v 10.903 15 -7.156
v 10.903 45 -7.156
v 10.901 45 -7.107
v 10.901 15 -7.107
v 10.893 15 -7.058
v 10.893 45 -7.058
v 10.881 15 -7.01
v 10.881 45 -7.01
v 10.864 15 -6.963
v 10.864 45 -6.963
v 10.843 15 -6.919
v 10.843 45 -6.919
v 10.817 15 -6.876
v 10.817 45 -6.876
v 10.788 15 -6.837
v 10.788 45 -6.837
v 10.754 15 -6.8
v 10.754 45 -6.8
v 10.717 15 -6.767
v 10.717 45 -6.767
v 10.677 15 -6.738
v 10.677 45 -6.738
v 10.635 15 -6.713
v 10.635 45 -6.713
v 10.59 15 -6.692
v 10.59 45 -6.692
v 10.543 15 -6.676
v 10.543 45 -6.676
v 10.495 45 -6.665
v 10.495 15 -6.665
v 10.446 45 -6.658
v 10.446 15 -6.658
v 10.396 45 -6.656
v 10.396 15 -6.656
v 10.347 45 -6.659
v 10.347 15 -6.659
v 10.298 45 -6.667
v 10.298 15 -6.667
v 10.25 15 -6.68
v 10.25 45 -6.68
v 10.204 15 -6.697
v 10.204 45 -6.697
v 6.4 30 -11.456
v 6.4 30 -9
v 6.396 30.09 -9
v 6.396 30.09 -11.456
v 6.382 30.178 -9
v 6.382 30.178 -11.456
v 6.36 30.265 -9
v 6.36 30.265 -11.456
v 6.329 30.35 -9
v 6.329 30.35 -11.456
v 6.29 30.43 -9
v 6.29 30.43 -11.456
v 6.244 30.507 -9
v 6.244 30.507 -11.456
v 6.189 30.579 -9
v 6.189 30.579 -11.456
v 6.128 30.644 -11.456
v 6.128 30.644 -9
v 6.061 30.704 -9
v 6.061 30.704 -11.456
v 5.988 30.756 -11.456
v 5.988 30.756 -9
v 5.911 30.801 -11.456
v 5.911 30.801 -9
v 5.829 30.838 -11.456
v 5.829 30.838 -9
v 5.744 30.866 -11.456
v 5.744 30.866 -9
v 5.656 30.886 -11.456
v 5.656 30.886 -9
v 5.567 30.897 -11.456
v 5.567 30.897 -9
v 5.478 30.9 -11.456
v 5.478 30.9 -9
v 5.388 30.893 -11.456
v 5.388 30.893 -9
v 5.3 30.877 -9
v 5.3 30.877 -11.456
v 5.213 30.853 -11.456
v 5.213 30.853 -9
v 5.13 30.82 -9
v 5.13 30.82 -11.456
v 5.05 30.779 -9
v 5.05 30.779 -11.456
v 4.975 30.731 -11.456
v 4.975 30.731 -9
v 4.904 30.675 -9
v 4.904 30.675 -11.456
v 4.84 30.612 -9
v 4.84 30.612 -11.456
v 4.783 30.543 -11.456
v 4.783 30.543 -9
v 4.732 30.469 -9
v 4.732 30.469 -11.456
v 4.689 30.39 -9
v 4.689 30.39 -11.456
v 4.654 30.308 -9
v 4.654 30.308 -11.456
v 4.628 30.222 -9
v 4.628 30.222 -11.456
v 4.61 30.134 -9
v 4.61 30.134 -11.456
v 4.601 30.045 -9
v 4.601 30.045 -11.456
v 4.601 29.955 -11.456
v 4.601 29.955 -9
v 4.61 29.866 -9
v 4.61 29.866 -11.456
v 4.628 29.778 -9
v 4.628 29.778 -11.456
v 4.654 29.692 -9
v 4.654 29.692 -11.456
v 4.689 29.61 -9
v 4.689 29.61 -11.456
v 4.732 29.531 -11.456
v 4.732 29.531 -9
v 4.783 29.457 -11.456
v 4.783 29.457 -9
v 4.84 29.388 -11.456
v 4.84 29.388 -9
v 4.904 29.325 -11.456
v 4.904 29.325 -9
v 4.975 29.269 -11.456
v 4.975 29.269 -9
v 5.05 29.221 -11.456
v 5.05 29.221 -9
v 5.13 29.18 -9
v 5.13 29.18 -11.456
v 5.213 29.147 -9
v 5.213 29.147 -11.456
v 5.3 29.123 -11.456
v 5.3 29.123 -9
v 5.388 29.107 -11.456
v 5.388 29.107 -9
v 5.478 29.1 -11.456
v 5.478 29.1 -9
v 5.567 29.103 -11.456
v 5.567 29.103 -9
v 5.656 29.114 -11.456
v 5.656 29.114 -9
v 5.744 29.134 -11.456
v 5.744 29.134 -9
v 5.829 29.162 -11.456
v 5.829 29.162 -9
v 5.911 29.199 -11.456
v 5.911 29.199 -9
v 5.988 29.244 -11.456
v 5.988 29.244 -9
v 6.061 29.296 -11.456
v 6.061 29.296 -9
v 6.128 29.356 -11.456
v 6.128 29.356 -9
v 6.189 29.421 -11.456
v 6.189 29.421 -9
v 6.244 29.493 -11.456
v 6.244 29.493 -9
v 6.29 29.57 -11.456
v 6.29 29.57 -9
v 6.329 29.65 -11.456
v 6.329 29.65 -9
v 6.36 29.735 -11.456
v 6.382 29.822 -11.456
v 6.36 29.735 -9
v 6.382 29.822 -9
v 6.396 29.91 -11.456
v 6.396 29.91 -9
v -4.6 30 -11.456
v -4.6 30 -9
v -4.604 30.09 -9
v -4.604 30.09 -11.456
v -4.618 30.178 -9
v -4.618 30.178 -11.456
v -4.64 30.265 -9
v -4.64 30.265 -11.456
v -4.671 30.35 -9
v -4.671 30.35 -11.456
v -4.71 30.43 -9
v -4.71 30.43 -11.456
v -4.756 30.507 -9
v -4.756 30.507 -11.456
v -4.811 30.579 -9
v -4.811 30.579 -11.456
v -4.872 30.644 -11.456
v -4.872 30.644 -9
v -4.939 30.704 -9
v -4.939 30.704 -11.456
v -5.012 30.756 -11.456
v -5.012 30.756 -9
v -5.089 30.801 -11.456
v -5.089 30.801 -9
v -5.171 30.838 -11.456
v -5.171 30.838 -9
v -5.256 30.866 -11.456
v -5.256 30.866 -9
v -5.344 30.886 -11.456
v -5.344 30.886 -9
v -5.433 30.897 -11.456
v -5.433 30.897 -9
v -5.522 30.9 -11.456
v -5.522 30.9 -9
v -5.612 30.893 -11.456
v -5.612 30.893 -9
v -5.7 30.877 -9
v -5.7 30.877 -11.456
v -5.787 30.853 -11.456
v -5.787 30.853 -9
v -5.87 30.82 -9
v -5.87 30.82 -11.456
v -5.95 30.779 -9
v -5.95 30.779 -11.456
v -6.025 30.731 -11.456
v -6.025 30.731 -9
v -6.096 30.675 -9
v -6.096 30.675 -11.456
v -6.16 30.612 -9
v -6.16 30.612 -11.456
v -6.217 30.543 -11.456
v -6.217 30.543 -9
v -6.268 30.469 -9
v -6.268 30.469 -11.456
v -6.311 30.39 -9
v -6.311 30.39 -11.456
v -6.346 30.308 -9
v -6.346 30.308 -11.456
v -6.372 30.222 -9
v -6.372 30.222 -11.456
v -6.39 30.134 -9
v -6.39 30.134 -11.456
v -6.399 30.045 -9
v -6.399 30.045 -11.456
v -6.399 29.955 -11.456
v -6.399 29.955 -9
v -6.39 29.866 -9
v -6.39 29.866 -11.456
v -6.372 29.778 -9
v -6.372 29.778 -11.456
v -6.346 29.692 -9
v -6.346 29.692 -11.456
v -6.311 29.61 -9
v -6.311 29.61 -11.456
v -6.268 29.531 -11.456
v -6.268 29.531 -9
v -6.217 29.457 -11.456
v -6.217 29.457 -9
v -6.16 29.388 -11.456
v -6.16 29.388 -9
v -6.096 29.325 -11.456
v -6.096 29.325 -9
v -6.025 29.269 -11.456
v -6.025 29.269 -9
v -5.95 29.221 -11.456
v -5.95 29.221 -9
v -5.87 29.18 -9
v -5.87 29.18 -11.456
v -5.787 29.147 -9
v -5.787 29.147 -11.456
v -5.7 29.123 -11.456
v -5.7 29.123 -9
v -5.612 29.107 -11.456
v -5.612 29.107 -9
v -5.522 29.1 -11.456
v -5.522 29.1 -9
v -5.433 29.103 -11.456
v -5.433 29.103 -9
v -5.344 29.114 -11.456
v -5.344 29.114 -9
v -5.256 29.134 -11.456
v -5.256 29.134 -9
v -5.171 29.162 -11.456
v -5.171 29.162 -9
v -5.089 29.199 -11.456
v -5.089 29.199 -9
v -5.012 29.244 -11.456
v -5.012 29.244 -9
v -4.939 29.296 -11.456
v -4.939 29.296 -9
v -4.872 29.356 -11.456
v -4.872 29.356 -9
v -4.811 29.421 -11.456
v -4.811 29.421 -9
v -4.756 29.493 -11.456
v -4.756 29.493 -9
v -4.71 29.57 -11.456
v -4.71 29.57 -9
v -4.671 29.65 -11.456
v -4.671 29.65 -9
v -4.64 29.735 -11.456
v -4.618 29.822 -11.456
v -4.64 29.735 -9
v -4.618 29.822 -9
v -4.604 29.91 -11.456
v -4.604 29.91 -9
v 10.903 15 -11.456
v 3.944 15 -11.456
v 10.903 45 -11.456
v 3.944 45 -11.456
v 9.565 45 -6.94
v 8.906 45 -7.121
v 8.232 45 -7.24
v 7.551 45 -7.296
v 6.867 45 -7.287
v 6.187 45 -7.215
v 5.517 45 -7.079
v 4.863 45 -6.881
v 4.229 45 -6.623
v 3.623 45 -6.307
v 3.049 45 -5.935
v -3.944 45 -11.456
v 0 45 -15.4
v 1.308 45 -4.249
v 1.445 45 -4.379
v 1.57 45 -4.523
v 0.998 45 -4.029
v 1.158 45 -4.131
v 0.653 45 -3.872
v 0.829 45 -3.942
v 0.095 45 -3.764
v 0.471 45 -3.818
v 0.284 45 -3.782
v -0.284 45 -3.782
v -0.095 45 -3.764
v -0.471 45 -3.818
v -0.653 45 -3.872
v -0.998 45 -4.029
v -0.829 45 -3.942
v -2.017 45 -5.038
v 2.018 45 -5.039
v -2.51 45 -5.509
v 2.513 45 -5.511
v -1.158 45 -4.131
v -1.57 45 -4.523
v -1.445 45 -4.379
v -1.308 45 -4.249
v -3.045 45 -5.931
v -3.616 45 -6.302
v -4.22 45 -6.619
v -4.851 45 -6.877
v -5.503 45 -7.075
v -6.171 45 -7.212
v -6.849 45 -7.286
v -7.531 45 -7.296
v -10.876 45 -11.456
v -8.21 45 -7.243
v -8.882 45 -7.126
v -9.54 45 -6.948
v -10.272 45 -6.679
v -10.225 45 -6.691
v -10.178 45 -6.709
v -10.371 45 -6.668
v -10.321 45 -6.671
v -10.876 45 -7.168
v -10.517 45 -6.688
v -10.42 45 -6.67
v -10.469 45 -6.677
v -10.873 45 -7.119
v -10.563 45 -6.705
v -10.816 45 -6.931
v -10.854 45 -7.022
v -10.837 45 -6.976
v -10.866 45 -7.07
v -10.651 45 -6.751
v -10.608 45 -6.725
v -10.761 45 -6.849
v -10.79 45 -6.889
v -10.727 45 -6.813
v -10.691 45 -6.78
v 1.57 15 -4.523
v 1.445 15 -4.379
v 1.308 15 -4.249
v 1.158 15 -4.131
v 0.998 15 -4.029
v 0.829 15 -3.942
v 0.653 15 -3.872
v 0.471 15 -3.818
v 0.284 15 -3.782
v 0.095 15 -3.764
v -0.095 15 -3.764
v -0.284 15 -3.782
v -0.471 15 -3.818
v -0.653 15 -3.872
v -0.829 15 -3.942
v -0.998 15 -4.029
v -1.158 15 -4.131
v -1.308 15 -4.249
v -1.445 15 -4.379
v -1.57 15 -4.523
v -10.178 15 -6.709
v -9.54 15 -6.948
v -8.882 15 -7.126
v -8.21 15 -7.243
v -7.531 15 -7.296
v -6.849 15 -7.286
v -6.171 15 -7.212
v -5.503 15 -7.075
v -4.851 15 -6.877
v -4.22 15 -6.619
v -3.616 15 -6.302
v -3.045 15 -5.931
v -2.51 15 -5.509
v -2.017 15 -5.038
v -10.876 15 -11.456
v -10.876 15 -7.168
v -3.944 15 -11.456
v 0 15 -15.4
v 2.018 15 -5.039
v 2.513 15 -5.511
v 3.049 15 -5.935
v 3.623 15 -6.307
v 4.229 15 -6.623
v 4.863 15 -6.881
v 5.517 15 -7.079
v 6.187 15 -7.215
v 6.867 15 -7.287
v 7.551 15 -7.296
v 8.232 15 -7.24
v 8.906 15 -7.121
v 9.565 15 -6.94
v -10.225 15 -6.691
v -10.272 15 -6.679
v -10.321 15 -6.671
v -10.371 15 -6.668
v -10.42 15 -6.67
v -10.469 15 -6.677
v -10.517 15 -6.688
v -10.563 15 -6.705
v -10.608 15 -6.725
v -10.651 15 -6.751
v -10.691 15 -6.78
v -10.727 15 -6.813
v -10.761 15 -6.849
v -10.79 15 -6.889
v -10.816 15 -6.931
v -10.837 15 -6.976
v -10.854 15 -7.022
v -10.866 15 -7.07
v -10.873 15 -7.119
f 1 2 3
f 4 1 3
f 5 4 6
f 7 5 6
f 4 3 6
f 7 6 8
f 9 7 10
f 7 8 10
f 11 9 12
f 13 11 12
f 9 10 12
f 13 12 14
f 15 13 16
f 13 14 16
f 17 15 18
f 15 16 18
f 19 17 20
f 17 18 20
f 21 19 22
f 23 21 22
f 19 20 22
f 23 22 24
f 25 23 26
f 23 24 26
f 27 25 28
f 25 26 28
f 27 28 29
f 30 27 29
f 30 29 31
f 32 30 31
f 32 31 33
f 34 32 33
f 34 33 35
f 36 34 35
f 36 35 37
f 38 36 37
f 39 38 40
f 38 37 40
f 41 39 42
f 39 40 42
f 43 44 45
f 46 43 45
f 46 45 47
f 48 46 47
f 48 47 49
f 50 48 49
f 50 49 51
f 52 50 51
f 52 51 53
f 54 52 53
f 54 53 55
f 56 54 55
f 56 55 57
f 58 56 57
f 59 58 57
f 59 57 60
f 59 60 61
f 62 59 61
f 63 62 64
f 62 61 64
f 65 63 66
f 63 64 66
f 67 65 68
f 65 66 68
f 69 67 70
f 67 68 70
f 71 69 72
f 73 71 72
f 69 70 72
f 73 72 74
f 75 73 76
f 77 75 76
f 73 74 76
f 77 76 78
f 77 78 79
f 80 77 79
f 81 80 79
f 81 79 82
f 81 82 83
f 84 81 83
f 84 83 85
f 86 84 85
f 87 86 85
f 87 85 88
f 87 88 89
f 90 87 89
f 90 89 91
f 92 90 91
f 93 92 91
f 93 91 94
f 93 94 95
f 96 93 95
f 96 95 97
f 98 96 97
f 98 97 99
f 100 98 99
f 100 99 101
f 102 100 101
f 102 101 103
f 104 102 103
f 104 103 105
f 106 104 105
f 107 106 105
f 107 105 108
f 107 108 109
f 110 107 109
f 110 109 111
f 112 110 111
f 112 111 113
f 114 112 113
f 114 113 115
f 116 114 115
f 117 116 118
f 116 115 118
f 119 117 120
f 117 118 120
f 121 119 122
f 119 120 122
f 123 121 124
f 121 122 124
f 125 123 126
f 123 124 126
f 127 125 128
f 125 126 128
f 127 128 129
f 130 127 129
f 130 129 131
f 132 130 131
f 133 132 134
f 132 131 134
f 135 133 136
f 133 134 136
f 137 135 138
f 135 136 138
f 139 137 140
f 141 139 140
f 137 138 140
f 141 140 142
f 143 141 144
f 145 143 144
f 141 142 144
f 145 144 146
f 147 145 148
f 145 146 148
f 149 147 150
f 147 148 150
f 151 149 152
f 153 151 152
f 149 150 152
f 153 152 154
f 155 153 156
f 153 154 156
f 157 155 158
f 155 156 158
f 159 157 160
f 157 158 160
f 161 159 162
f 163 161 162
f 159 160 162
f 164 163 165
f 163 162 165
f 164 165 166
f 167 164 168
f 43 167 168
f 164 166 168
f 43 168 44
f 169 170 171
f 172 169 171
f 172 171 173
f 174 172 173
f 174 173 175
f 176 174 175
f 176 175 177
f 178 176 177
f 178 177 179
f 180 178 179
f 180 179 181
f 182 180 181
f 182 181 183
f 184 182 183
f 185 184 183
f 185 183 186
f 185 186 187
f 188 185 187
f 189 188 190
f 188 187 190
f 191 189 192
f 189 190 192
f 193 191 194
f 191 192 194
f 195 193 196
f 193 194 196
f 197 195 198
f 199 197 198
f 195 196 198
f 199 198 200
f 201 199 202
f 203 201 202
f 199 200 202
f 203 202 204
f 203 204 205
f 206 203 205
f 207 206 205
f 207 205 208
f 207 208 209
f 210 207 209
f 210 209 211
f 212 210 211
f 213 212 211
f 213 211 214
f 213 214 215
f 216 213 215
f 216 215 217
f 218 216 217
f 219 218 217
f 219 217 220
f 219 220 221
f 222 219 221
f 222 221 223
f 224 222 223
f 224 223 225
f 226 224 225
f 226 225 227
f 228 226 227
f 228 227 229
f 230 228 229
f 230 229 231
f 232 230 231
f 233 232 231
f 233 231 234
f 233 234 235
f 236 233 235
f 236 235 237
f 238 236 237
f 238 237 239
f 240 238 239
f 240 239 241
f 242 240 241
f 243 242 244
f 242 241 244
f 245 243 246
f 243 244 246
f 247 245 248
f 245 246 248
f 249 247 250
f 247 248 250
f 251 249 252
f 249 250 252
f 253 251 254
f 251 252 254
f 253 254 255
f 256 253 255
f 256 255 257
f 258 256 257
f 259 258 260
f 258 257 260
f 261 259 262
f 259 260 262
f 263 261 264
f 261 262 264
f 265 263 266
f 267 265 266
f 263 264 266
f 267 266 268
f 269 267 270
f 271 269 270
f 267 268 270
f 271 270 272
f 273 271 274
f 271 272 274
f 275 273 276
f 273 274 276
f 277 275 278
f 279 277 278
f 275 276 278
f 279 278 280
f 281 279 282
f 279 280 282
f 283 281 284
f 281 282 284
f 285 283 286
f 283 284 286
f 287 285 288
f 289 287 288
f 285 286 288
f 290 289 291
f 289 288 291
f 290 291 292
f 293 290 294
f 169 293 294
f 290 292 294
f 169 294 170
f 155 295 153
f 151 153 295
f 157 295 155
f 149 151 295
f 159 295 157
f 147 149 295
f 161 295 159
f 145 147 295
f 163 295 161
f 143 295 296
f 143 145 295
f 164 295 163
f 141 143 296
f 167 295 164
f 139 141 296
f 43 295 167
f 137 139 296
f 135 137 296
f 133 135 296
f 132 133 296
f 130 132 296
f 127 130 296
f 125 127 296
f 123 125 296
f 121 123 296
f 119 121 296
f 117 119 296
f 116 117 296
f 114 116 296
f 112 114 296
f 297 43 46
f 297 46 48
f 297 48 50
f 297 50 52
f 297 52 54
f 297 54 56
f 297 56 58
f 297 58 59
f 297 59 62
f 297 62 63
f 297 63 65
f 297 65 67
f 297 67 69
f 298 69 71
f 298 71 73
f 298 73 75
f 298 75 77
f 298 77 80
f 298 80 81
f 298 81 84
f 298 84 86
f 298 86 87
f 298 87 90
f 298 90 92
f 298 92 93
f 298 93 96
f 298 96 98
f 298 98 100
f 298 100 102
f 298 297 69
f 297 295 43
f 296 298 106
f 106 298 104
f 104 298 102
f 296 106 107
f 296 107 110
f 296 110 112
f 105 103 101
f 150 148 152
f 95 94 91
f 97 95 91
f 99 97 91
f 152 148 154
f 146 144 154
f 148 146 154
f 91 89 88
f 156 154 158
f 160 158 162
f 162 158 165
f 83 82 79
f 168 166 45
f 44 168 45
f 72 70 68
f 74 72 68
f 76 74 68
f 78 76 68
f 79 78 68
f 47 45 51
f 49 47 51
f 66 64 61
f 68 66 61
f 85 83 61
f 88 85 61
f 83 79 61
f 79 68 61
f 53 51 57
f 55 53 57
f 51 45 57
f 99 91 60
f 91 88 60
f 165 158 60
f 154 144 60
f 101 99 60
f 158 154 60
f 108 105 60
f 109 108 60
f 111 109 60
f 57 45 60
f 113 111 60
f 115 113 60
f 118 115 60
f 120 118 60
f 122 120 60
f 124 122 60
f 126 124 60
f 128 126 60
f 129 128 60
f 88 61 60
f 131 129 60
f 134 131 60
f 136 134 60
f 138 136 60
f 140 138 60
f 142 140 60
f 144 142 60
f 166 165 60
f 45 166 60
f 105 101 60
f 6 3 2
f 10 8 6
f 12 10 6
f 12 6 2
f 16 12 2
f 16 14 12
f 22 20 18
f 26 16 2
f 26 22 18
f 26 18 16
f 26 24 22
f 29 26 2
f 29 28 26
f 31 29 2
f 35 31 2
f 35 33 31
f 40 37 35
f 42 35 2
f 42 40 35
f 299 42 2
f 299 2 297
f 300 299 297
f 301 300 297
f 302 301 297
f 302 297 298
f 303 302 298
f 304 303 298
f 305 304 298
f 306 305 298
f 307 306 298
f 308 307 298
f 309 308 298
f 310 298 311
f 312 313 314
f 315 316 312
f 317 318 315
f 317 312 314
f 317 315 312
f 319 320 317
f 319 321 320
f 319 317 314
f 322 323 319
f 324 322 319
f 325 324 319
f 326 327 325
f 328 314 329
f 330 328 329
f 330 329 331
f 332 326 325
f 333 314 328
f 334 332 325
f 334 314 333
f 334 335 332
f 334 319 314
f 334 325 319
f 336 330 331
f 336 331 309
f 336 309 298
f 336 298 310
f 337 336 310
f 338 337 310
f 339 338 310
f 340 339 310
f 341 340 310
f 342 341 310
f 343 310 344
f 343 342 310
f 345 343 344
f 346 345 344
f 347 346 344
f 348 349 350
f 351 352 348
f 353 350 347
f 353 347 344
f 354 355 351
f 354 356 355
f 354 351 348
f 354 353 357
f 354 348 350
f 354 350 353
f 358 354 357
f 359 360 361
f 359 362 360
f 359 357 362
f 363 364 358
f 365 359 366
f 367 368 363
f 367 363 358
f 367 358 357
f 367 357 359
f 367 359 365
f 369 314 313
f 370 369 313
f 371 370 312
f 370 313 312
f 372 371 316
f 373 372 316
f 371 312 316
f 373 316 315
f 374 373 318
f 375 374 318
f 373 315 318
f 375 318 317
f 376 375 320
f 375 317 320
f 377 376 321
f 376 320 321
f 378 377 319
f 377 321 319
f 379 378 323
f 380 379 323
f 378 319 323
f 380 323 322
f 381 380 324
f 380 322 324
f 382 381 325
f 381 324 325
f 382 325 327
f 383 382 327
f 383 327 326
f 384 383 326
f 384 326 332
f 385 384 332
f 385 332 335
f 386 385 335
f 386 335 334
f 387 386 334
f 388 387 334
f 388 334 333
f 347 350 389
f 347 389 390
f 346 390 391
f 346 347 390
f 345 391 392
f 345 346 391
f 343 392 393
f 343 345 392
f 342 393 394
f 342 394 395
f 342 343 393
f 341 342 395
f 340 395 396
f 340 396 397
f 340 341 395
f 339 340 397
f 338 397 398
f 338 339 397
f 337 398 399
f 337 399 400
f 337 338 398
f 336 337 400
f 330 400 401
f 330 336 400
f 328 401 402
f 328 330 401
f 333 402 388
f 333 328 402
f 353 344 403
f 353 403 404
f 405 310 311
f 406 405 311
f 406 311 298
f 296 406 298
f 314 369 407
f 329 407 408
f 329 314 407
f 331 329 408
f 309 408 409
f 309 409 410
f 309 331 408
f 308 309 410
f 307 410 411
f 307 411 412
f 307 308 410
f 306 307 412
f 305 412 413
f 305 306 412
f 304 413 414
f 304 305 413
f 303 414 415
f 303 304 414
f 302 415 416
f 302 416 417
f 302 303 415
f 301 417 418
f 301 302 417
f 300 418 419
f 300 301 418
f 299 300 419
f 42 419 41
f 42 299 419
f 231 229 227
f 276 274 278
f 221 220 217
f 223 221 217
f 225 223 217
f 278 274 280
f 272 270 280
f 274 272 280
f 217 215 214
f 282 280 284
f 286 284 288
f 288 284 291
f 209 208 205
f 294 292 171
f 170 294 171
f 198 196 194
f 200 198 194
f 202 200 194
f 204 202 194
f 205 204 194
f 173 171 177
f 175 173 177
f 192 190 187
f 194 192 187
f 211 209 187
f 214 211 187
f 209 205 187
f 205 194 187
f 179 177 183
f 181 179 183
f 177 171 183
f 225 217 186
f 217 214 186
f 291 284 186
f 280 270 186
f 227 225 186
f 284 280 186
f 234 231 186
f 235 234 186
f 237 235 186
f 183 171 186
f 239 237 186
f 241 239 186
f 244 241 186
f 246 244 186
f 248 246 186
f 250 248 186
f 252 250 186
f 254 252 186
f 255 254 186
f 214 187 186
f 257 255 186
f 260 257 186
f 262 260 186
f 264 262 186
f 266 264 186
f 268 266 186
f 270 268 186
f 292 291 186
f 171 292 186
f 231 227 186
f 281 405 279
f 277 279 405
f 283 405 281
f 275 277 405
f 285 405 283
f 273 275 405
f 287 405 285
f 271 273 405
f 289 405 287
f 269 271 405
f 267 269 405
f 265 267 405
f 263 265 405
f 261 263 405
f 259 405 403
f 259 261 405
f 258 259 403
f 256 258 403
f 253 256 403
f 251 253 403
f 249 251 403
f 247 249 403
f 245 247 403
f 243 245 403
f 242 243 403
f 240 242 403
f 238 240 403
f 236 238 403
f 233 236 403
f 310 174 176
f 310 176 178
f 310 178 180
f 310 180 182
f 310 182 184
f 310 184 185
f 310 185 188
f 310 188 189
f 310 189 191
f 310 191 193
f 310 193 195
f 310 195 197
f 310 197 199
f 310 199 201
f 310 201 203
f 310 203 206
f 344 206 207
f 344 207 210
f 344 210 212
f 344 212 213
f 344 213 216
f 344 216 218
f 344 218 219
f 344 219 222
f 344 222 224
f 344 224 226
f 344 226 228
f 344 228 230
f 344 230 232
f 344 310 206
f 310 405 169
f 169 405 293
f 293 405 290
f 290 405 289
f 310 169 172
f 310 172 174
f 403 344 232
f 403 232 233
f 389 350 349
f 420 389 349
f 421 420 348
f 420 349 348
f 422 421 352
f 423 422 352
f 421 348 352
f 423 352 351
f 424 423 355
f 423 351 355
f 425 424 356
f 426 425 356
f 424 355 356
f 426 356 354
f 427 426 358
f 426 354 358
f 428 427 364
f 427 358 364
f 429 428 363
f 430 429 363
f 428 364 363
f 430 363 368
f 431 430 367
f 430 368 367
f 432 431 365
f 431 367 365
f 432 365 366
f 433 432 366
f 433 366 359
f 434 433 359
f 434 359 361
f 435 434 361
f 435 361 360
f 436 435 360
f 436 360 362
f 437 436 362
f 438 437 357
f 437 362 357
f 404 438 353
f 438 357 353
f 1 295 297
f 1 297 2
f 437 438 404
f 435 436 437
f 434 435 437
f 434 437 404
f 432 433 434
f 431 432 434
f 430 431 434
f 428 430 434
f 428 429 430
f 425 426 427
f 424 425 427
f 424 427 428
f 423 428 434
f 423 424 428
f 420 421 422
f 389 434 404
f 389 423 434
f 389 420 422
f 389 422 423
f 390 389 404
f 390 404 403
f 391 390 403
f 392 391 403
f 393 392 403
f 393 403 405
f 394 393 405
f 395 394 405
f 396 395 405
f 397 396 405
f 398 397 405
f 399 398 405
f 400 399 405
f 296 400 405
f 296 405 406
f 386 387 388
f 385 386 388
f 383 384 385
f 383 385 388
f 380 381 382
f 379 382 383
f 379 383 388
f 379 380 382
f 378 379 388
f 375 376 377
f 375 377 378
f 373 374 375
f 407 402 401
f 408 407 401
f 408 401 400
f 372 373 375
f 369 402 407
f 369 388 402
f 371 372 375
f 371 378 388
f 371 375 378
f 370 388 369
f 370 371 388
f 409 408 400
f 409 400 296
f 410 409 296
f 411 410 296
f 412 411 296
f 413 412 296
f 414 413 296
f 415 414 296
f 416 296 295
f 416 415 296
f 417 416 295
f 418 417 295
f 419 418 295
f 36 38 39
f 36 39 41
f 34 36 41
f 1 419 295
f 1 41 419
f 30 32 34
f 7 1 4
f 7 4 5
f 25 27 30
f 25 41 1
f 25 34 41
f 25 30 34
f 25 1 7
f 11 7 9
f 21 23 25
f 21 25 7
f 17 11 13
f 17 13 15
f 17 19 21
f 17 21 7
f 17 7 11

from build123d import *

# Parameters (mm, degrees)
PAD005_DEPTH    = 30
PAD006_DEPTH    = 30
SKETCH043_R     = 0.9
POCKET016_DEPTH = 5


with BuildPart() as part:
    # Sketch037 → Pad005 (new body)
    with BuildSketch(Plane.XZ.offset(-45)):
        with BuildLine():
            ThreePointArc((-10.178404, -6.708561), (-5.503497, -7.075491), (-1.569892, -4.522816))
            ThreePointArc((1.569892, -4.522816), (0, -3.761944), (-1.569892, -4.522816))
            ThreePointArc((1.569892, -4.522816), (5.517054, -7.07892), (10.204085, -6.697484))
            ThreePointArc((10.902995, -7.156215), (10.677354, -6.738211), (10.204085, -6.697484))
            Line((10.902995, -11.456215), (10.902995, -7.156215))
            Line((10.902995, -11.456215), (-10.875555, -11.456215))
            Line((-10.875555, -11.456215), (-10.875555, -7.168051))
            ThreePointArc((-10.178404, -6.708561), (-10.650714, -6.750574), (-10.875555, -7.168051))
        make_face()
    extrude(amount=PAD005_DEPTH)

    # Sketch042 → Pad006 (join)
    with BuildSketch(Plane.XZ.offset(-45)):
        Polygon((-4, -11.4), (0, -15.4), (4, -11.4), align=None)
    extrude(amount=PAD006_DEPTH)

    # Sketch043 → Pocket016 (cut)
    with BuildSketch(Plane.XY.offset(-9)):
        with Locations((-5.5, 30)):
            Circle(SKETCH043_R)
        with Locations((-5.5, -30)):
            Circle(SKETCH043_R)
        with Locations((5.5, 30)):
            Circle(SKETCH043_R)
        with Locations((5.5, -30)):
            Circle(SKETCH043_R)
    extrude(amount=-POCKET016_DEPTH, mode=Mode.SUBTRACT)


solid = part.part
